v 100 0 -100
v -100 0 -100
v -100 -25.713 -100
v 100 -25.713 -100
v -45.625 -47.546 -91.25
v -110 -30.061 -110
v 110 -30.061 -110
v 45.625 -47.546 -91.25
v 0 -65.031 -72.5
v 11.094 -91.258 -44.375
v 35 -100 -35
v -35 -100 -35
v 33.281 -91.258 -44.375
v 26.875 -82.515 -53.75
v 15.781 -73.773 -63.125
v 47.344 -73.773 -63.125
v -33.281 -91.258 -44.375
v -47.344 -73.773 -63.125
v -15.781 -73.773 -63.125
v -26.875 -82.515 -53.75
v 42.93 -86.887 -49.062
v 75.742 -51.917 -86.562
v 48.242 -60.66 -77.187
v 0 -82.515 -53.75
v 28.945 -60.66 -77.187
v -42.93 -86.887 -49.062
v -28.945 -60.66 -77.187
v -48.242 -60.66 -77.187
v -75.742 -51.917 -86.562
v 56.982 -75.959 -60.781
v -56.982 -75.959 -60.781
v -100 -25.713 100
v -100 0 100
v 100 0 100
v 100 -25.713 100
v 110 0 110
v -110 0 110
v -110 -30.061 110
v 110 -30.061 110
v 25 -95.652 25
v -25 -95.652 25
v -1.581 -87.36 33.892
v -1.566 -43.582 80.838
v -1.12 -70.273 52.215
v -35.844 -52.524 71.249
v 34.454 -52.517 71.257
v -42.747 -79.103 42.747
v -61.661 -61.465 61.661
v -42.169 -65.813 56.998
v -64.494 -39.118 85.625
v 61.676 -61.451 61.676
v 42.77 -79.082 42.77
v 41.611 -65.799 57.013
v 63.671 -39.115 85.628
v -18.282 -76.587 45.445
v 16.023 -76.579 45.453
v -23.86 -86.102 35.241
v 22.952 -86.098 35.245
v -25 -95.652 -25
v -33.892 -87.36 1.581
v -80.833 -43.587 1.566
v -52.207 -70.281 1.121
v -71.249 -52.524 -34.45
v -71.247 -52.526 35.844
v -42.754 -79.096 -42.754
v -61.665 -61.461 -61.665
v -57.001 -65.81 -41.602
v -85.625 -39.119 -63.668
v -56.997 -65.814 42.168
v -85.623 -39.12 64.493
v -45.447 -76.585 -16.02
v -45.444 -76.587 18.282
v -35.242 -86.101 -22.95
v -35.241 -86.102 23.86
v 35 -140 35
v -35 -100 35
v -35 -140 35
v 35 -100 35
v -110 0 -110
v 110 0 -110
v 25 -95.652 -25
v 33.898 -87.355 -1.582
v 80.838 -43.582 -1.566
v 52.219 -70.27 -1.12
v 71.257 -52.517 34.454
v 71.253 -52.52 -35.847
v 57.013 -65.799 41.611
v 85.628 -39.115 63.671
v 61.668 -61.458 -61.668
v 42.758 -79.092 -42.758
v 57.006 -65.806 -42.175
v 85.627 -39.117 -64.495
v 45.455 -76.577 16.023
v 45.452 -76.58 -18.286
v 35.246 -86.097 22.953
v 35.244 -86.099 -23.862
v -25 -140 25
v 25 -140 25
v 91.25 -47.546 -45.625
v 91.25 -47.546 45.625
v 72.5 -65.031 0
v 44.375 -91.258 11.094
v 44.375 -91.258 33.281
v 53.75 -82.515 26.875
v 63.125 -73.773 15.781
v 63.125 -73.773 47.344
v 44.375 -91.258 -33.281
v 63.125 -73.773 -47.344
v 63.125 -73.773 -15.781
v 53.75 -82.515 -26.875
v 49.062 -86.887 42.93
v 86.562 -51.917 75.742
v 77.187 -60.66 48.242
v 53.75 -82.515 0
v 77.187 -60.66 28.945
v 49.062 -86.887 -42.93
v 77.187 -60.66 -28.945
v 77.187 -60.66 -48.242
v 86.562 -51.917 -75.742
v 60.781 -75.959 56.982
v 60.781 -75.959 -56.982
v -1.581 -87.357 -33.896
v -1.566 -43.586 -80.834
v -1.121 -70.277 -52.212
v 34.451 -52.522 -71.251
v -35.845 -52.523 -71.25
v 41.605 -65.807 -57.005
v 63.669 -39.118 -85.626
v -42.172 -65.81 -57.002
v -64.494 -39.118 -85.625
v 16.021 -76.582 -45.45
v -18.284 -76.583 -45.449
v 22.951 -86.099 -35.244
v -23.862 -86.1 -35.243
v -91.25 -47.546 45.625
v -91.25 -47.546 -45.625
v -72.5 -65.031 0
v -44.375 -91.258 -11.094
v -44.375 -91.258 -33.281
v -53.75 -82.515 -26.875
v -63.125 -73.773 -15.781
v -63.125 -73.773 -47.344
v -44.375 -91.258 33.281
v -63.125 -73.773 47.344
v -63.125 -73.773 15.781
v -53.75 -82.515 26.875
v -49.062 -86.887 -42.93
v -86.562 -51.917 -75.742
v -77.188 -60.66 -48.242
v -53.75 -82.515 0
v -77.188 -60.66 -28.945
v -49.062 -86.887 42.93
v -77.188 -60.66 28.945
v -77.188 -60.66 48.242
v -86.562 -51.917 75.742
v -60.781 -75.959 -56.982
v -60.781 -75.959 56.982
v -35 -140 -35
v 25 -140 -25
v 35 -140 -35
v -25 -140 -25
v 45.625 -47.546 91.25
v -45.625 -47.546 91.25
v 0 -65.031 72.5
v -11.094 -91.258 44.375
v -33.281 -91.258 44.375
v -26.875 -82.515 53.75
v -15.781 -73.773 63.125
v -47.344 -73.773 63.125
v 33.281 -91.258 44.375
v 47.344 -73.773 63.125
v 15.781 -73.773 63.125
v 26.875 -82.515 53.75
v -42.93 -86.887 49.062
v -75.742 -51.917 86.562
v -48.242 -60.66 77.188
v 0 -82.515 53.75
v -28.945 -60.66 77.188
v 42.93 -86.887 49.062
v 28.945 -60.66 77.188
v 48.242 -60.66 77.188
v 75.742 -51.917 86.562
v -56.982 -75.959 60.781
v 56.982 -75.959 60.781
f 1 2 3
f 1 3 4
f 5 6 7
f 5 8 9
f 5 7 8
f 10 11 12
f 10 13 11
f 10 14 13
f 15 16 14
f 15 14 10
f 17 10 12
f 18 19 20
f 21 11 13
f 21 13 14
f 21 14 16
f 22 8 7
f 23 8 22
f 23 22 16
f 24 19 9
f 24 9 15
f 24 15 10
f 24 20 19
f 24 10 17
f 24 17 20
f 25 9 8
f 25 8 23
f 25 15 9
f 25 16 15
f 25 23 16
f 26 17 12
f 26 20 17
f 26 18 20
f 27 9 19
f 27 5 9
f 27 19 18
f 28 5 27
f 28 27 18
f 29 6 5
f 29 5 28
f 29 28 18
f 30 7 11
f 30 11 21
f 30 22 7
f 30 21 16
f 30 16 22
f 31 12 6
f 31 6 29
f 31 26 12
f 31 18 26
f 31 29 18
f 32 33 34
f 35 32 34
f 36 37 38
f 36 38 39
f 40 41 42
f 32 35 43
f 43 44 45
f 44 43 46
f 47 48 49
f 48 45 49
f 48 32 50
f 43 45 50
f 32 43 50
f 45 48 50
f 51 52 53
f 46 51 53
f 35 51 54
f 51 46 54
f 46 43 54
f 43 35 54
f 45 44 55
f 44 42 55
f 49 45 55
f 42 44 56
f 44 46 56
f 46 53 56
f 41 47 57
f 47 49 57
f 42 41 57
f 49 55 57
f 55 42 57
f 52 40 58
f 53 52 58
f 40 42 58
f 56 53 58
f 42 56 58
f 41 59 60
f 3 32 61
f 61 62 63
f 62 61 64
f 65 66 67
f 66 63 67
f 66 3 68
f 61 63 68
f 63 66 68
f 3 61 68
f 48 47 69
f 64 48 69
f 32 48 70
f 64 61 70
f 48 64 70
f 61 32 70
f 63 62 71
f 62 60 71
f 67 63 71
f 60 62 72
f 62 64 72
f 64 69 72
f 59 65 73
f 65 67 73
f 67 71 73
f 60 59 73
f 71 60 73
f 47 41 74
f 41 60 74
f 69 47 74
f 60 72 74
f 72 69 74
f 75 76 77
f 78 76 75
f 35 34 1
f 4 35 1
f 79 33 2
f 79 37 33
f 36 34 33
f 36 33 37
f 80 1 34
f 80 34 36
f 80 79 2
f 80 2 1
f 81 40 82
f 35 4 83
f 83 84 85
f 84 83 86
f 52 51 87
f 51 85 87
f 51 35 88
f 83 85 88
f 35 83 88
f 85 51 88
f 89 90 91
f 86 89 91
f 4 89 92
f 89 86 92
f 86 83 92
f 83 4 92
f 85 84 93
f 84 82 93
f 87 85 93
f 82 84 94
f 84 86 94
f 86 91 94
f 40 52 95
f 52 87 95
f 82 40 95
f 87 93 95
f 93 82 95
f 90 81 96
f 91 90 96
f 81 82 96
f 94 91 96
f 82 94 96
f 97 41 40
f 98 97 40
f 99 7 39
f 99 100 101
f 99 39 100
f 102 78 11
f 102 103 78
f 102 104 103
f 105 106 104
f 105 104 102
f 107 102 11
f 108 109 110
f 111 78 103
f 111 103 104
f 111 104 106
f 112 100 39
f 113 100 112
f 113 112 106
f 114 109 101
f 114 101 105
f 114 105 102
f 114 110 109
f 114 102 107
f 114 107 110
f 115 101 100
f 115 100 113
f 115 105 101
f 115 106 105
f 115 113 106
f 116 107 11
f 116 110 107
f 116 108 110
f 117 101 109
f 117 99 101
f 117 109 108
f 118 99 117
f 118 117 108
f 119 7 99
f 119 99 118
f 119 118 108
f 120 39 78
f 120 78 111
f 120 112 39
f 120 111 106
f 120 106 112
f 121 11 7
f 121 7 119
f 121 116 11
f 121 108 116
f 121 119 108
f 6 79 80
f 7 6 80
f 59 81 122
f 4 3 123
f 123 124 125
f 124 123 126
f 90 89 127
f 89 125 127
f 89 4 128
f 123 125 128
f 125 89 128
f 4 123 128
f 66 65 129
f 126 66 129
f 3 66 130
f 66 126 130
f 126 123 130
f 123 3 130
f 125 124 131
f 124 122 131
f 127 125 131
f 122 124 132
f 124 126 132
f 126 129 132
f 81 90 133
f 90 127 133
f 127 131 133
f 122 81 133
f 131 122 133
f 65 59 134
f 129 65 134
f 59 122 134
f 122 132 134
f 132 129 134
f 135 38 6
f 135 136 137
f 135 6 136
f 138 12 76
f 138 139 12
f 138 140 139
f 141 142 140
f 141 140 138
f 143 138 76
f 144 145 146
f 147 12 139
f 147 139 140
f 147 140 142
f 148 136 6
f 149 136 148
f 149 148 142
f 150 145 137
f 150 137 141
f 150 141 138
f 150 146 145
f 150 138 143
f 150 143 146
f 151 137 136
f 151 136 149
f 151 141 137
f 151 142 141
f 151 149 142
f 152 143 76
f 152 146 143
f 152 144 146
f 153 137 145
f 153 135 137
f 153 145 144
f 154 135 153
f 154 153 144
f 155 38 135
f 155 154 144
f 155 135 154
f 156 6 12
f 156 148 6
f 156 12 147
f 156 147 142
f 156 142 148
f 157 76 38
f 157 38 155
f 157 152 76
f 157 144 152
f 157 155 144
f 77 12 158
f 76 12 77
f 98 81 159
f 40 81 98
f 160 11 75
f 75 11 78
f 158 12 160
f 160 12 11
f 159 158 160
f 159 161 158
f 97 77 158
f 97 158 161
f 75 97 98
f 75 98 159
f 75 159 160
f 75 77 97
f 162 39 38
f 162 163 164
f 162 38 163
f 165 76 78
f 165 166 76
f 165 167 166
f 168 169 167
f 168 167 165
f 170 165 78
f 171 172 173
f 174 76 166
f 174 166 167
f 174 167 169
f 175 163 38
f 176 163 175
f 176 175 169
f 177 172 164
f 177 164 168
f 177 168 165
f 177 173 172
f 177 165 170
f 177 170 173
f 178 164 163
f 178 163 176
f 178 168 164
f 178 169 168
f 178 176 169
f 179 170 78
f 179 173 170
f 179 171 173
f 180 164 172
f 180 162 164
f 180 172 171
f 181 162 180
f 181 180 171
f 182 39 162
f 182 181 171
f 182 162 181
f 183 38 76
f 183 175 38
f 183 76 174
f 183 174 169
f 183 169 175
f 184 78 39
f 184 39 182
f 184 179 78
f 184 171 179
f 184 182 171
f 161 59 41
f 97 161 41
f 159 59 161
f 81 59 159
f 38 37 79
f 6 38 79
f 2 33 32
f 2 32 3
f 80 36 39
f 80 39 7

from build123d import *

# Parameters (mm, degrees)
CROQUIS1_W              = 220
CROQUIS1_H              = 220
SALIENTE_EXTRUIR1_DEPTH = 100
CROQUIS2_OUTSIDE_W      = 437.492
CROQUIS2_OUTSIDE_H      = 437.492
CROQUIS2_OUTSIDE_W_2    = 70
CROQUIS2_OUTSIDE_H_2    = 70
CORTAR_EXTRUIR1_DEPTH   = 70
CORTAR_EXTRUIR1_TAPER   = 47
CROQUIS3_W              = 70
CROQUIS3_H              = 70
SALIENTE_EXTRUIR2_DEPTH = 40
VACIADO1_T              = -10
CROQUIS3_3_W            = 50
CROQUIS3_3_H            = 50
CORTAR_EXTRUIR2_DEPTH   = 40


with BuildPart() as part:
    # Croquis1 → Saliente-Extruir1 (new body)
    with BuildSketch(Plane(origin=(0, 0, 0), x_dir=(1, 0, 0), z_dir=(0, 1, 0))):
        Rectangle(CROQUIS1_W, CROQUIS1_H)
    extrude(amount=-SALIENTE_EXTRUIR1_DEPTH)

    # Croquis2 outside → Cortar-Extruir1 (cut)
    with BuildSketch(Plane.XZ.offset(100)):
        Rectangle(CROQUIS2_OUTSIDE_W, CROQUIS2_OUTSIDE_H)
        Rectangle(CROQUIS2_OUTSIDE_W_2, CROQUIS2_OUTSIDE_H_2, mode=Mode.SUBTRACT)
    extrude(amount=-CORTAR_EXTRUIR1_DEPTH, taper=CORTAR_EXTRUIR1_TAPER, mode=Mode.SUBTRACT)

    # Croquis3 → Saliente-Extruir2 (add)
    with BuildSketch(Plane.XZ.offset(100)):
        Rectangle(CROQUIS3_W, CROQUIS3_H)
    extrude(amount=SALIENTE_EXTRUIR2_DEPTH)

    # Vaciado1
    vaciado1_openings = [part.faces().sort_by_distance(p)[0] for p in [
        (0, 0, 0),
    ]]
    offset(amount=VACIADO1_T, openings=vaciado1_openings, kind=Kind.INTERSECTION)

    # Croquis3<3> → Cortar-Extruir2 (cut)
    with BuildSketch(Plane.XZ.offset(100)):
        Rectangle(CROQUIS3_3_W, CROQUIS3_3_H)
    extrude(amount=CORTAR_EXTRUIR2_DEPTH, mode=Mode.SUBTRACT)


solid = part.part
